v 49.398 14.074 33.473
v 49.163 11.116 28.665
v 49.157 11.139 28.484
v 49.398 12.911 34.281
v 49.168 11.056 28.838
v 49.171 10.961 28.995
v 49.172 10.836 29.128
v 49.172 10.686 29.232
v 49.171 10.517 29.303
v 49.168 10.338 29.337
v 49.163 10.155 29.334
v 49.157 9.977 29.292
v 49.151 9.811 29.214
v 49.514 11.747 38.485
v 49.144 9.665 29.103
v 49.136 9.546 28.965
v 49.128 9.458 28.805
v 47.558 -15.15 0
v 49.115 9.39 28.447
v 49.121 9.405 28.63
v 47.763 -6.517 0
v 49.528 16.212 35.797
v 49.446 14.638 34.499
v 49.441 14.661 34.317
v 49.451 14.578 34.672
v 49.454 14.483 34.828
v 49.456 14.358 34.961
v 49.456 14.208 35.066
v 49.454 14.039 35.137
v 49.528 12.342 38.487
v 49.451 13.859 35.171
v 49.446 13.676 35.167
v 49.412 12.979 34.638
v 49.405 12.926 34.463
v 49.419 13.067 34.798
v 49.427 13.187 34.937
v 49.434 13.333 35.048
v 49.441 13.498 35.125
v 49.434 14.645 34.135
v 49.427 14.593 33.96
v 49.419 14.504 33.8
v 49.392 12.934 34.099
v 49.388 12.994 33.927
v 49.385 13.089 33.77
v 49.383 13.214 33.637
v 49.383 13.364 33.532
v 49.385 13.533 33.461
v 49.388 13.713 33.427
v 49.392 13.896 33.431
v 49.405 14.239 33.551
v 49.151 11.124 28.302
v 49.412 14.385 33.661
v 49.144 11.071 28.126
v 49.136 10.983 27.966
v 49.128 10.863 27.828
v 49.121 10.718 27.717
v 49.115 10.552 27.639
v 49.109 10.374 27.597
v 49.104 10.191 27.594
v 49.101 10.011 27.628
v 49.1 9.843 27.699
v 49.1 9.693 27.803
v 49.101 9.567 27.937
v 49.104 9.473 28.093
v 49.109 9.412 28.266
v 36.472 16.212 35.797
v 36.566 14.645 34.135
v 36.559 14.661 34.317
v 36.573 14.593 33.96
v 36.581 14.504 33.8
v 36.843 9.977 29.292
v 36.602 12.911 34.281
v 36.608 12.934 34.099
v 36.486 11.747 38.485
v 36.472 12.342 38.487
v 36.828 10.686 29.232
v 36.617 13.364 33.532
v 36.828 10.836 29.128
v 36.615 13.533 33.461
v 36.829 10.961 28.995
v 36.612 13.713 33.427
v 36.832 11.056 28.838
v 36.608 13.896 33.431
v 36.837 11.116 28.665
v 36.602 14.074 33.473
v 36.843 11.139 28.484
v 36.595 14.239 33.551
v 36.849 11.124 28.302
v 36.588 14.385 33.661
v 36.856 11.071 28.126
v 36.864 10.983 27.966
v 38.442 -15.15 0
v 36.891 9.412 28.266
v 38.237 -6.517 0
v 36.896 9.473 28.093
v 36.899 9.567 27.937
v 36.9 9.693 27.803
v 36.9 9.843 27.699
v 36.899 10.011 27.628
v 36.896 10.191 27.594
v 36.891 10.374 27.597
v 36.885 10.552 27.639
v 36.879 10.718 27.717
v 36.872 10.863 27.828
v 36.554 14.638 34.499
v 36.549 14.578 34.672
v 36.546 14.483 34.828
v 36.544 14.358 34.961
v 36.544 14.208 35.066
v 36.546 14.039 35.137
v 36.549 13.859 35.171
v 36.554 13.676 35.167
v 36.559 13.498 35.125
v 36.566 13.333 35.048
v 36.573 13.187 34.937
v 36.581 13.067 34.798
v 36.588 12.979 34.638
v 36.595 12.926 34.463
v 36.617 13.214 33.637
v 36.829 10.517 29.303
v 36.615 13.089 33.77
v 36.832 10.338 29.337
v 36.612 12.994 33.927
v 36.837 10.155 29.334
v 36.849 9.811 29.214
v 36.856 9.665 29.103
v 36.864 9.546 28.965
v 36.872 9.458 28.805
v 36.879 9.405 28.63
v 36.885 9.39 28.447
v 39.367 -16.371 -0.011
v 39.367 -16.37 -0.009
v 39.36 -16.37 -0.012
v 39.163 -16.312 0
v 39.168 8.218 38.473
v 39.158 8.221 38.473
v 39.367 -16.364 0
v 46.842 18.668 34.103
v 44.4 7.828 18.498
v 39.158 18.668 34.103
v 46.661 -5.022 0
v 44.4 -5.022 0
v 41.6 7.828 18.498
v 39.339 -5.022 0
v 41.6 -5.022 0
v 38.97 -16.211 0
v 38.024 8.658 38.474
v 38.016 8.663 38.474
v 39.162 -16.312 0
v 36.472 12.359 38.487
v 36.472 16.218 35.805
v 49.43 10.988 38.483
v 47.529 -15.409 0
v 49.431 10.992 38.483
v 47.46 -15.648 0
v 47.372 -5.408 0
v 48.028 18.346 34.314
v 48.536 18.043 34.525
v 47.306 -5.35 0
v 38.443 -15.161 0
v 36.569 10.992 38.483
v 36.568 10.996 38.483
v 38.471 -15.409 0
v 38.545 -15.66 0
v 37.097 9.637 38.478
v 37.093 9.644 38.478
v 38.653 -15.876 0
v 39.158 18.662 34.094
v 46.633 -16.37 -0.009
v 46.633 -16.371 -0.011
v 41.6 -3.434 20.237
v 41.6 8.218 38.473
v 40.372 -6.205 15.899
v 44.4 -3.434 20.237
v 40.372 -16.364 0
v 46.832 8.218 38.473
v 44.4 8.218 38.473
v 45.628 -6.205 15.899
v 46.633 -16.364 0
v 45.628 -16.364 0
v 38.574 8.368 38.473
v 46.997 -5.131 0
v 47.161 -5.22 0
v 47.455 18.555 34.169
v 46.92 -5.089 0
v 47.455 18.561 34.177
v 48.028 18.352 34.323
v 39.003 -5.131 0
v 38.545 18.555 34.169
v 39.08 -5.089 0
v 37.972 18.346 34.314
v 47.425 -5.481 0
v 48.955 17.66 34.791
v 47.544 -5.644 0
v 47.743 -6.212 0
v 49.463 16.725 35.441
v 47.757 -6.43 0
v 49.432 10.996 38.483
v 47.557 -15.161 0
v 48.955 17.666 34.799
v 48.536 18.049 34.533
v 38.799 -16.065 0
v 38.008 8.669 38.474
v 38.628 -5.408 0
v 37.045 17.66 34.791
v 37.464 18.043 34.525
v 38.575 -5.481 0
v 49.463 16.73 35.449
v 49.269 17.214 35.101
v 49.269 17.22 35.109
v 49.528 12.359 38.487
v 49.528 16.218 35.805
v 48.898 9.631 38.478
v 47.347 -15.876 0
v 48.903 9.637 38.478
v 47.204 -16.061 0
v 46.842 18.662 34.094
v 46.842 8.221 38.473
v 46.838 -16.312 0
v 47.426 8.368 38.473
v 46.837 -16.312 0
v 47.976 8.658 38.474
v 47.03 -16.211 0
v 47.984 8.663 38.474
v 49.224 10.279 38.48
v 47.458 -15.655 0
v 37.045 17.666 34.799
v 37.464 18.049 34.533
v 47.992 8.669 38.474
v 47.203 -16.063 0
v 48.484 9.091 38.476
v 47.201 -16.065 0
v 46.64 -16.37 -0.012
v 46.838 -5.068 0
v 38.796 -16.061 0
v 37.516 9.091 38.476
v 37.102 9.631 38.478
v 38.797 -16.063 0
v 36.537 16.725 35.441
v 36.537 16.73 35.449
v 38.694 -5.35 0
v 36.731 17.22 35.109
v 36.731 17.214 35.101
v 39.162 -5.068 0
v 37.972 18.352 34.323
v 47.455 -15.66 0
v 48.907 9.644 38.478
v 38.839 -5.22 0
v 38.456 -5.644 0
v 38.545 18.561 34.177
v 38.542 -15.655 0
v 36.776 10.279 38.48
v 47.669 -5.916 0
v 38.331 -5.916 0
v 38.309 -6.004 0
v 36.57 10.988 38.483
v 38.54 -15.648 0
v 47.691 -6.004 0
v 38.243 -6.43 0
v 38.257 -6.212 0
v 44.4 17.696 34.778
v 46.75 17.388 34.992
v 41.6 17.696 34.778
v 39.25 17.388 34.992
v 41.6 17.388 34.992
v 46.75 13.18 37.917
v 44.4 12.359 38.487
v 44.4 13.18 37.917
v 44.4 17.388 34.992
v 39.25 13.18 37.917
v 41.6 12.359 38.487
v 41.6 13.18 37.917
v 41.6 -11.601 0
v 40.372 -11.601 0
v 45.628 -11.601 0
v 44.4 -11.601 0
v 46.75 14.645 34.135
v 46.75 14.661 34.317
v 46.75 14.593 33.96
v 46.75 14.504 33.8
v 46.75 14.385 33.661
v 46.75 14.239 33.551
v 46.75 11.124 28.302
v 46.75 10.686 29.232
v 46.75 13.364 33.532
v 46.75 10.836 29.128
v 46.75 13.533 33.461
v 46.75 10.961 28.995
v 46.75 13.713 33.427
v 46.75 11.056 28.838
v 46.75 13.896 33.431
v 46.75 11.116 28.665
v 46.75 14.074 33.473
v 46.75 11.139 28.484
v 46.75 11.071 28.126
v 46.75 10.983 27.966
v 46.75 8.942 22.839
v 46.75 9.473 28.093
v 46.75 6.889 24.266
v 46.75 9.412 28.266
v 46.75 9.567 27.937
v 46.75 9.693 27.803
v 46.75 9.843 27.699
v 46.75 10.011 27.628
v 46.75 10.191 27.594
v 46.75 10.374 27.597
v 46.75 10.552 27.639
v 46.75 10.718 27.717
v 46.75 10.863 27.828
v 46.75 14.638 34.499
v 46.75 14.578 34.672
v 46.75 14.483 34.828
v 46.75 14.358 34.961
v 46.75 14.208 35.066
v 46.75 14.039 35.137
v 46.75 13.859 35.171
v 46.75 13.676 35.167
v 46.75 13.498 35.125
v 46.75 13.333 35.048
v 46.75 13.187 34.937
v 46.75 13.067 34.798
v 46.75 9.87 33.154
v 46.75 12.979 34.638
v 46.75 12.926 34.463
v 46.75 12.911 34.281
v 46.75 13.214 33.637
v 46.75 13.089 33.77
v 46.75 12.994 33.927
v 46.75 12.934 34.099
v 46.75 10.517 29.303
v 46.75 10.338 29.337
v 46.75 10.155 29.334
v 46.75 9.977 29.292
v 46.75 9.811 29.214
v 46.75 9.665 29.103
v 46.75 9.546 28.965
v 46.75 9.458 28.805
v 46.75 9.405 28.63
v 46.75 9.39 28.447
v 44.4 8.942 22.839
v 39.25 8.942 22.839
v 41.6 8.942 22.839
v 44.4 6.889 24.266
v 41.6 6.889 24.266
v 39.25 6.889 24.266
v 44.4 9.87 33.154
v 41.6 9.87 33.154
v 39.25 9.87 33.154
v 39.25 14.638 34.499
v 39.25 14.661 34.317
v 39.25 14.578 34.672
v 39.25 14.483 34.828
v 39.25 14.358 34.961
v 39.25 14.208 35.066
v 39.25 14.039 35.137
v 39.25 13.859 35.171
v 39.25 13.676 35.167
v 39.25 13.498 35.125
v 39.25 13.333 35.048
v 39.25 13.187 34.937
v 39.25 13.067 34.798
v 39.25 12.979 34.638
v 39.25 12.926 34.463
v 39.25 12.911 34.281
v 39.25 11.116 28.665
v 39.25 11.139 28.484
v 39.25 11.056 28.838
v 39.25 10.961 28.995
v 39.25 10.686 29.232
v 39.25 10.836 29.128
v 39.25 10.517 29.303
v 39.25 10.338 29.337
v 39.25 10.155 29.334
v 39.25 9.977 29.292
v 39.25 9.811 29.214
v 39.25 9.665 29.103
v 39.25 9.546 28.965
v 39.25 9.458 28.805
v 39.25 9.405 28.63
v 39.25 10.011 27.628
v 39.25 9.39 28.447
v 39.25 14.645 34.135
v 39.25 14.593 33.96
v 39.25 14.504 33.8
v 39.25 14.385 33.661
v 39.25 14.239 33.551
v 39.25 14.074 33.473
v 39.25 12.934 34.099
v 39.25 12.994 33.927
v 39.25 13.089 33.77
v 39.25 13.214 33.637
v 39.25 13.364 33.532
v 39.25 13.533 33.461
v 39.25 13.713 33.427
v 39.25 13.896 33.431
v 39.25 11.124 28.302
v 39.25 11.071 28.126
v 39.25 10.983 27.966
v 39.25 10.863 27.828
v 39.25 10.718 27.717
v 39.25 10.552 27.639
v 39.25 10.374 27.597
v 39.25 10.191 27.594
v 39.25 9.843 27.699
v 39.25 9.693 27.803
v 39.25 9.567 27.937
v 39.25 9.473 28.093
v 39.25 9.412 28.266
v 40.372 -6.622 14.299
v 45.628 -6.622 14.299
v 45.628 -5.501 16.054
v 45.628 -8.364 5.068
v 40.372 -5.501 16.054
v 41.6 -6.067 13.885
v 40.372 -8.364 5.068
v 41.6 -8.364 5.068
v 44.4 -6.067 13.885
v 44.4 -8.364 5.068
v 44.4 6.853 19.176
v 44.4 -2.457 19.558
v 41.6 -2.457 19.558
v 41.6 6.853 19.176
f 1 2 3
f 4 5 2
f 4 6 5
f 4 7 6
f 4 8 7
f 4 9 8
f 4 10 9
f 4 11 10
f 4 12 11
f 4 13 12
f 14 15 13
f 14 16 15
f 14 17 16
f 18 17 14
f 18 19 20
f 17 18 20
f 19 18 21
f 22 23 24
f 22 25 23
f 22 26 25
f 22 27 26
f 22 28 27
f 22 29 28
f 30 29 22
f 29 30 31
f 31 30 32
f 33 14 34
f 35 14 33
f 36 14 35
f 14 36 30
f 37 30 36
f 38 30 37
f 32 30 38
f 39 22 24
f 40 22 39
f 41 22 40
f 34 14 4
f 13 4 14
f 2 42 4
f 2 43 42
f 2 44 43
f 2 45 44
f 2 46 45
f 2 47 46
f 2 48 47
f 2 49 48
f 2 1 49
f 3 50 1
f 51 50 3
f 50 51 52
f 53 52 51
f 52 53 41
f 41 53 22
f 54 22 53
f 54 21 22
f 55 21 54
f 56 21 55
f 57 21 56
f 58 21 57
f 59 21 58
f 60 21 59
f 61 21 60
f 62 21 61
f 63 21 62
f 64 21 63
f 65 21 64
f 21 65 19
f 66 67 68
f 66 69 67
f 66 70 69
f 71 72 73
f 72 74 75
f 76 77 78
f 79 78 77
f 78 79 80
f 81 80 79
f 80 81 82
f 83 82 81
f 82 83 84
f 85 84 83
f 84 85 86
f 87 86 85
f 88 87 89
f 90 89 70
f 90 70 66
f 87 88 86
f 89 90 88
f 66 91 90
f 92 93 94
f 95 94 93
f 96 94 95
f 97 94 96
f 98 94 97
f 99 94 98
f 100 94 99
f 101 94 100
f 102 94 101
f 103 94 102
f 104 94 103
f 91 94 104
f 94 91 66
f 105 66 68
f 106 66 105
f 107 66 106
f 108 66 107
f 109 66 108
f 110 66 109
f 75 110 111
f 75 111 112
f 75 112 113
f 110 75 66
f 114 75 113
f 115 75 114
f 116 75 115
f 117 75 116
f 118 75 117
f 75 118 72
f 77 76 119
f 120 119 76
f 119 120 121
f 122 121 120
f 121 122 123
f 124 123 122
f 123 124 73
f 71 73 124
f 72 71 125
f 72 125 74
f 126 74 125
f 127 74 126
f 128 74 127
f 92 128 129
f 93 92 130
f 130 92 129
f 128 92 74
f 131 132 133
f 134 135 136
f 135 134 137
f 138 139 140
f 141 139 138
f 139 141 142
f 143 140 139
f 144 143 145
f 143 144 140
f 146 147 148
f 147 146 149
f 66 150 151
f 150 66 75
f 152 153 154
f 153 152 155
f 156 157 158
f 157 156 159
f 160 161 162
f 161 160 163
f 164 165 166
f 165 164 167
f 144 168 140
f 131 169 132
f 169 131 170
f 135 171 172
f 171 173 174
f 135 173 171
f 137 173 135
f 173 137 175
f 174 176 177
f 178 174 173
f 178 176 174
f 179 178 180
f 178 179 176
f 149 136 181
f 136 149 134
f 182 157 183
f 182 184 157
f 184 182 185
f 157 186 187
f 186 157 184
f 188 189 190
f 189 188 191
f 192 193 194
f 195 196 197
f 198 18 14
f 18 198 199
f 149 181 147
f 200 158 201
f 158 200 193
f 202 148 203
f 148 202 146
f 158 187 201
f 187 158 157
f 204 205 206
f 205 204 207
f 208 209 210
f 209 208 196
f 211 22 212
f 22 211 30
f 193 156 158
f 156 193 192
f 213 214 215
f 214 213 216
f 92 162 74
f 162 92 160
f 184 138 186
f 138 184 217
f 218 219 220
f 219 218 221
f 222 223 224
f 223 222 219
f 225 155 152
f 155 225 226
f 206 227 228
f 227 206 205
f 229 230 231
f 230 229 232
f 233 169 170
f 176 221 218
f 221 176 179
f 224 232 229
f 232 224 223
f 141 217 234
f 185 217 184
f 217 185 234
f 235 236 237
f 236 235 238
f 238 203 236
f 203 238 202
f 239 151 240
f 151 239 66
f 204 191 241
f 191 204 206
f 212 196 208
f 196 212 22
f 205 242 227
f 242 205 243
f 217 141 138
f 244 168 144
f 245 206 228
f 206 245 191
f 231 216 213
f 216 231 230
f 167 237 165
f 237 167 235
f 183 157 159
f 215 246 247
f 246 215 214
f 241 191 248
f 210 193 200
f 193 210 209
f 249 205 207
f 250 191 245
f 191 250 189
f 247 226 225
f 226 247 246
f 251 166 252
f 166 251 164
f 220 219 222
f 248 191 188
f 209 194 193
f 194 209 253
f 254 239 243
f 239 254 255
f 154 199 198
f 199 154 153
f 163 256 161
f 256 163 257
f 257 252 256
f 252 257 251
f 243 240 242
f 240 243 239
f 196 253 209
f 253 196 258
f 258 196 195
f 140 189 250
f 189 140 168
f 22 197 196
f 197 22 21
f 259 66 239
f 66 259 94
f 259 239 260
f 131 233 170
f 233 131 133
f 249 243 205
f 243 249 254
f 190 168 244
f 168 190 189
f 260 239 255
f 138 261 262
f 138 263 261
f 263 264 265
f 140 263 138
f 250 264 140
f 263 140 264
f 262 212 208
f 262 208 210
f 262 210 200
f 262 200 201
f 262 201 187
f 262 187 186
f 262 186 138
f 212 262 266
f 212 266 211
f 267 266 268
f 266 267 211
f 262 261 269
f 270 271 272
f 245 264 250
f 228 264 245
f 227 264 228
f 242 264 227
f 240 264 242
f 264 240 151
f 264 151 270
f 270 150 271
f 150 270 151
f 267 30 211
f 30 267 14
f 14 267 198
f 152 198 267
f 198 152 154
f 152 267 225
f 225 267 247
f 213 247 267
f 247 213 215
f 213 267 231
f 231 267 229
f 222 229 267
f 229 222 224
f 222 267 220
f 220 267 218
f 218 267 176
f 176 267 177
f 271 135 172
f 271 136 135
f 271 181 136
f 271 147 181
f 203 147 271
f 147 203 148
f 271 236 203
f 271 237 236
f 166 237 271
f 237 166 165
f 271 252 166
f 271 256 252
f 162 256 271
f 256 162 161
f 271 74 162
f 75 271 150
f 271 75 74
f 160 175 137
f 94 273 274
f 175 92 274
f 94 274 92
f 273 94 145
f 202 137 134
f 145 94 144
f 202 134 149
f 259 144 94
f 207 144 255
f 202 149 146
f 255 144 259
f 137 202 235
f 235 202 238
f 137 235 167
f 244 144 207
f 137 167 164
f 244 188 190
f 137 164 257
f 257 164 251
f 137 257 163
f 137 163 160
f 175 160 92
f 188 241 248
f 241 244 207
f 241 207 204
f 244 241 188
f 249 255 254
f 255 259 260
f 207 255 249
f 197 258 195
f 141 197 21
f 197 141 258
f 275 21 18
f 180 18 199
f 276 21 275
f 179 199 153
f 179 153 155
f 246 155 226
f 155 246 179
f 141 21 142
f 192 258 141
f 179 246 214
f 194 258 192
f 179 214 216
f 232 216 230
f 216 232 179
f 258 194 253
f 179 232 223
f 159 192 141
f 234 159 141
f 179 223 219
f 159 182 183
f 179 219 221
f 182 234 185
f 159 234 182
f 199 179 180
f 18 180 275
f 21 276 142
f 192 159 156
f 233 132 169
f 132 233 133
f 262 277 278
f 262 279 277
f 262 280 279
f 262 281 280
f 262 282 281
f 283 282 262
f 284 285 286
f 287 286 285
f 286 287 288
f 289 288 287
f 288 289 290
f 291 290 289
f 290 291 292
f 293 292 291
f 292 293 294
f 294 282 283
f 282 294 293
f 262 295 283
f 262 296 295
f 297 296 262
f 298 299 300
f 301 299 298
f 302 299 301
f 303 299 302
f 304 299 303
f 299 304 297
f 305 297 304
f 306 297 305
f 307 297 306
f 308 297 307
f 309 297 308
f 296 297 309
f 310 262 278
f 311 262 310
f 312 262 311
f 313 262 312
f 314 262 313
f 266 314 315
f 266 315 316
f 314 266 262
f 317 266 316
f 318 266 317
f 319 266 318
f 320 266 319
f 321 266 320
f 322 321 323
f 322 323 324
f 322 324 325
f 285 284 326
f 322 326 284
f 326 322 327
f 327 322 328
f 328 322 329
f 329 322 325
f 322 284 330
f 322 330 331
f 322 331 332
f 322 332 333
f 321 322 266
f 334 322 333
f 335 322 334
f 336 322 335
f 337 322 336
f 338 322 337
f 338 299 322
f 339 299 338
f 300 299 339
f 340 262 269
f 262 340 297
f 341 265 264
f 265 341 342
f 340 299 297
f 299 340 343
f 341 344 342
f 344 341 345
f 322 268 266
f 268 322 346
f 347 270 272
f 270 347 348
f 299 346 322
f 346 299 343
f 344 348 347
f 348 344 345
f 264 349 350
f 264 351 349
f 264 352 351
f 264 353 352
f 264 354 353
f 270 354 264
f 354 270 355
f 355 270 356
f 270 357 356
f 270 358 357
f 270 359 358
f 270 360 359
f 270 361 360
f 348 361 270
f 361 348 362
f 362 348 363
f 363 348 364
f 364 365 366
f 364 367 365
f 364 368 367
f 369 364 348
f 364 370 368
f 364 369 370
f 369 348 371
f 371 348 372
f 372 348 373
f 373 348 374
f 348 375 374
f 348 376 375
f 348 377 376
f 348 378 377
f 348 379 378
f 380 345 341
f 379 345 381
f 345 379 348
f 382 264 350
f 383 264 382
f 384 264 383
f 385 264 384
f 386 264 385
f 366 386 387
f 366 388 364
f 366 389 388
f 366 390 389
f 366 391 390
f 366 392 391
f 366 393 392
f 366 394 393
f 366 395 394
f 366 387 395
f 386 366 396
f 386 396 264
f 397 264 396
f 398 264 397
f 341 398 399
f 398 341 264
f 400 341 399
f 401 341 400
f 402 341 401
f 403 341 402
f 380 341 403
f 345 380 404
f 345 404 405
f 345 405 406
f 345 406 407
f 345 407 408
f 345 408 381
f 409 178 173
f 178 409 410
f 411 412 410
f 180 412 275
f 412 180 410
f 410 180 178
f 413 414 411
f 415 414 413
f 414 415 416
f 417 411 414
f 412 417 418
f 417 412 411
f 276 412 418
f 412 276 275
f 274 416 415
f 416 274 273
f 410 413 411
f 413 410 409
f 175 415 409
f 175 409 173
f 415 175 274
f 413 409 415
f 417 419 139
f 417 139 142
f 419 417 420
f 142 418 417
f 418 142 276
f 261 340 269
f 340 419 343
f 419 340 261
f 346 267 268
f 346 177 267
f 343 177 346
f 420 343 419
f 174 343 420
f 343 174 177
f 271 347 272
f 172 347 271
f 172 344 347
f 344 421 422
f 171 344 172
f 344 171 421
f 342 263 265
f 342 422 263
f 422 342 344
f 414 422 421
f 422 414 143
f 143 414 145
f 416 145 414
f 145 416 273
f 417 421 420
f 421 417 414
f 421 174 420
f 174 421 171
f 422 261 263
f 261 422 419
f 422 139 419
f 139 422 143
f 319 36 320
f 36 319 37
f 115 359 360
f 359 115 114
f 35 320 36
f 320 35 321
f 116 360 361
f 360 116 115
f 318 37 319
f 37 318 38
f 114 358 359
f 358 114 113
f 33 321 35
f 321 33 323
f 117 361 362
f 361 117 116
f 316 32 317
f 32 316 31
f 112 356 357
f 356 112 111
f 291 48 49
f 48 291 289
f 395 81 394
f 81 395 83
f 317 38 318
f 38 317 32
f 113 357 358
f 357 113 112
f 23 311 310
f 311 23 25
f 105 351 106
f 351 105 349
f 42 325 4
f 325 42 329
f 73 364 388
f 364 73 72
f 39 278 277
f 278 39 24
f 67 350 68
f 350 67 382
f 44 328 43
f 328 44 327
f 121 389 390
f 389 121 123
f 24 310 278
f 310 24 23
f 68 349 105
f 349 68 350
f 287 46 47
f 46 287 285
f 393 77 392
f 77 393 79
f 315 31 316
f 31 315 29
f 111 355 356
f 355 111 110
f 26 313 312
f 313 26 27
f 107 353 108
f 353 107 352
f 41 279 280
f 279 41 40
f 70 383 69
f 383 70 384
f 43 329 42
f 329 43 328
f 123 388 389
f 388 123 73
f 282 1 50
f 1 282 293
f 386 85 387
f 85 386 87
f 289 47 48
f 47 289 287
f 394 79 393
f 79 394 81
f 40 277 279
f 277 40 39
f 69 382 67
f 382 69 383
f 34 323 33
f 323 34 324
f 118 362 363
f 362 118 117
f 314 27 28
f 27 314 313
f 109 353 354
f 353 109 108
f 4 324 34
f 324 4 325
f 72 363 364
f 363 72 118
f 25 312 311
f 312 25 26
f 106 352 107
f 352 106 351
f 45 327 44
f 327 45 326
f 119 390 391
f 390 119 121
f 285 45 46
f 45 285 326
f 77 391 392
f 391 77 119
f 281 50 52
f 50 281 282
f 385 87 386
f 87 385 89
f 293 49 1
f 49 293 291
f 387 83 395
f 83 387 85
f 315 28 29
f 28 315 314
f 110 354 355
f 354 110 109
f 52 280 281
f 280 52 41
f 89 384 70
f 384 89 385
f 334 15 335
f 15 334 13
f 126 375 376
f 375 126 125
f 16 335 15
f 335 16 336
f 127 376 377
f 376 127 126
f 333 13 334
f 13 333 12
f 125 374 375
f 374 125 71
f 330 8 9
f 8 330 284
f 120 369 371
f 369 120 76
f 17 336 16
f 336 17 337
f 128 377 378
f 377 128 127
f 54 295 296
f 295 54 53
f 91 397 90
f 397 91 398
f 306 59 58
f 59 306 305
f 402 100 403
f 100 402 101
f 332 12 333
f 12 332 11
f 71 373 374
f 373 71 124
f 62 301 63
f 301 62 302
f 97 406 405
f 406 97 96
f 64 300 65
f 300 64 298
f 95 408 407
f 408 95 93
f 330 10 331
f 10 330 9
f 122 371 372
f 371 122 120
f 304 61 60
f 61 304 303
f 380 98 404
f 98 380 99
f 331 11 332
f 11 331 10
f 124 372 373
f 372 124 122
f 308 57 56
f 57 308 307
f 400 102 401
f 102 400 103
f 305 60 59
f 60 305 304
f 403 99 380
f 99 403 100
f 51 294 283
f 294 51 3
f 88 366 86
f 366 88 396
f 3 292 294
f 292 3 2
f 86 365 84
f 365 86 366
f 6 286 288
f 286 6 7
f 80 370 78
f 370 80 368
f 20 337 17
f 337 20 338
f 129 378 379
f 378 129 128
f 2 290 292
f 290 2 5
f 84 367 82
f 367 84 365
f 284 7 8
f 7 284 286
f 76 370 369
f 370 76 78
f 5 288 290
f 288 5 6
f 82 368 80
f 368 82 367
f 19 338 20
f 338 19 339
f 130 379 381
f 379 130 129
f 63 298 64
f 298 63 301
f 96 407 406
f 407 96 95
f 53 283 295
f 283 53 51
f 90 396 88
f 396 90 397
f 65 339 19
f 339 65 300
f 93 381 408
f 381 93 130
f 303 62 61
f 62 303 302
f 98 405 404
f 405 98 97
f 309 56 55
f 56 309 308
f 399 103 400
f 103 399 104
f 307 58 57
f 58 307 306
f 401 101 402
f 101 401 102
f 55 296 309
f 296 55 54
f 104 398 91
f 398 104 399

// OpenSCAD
// file: bezier.scad
/* Copied more or less blindly from https://benjaminwand.github.io/verbose-cv/projects/bezier_curves.html */

// --- VARIABLES ---
// roughly the size of parts of curves
// fs = 0.5;

// points
p1 = [5.5, 0];
p2 = [1.5, 0];
p3 = [0, 2];
p4 = [0, 7];

// --- FUNCTIONS AND MODULES ---
// calculates the amount of points
// from distance of two points and fs
function fn(a, b, fs=0.5) =
  round(sqrt(pow(a[0]-b[0],2)
  + pow(a[1]-b[1], 2))/fs);

// calculate each individual point
function b_pts(pts, n, idx) =
  len(pts)>2 ?
    b_pts([for(i=[0:len(pts)-2])
        pts[i]], n, idx) * n*idx
      + b_pts([for(i=[1:len(pts)-1])
        pts[i]], n, idx) * (1-n*idx)
    : pts[0] * n*idx
      + pts[1] * (1-n*idx);

// calculate fn() for given points,
// call b_pts() and concatenate points
function b_curv(pts, fs=0.5) =
  let (fn=fn(pts[0], pts[len(pts)-1], fs=fs))
    [for (i= [0:fn])
      concat(b_pts(pts, 1/fn, i))];

// displaying points as a rainbow
module rainbow (points) {
for (i= [0 : len(points)-1 ])
  color([cos(20*i)/2+0.5,
    -sin(20*i)/2+0.5,
    -cos(20*i)/2+0.5,
    1])
  translate(points[i]) sphere(0.5, $fn=10);
}
/*
// --- THE ACTUAL MODEL ---
// calculating the points
points = b_curv([p1, p2, p3, p4]);

// displaying the calculated points
// rainbow(points);
linear_extrude(20){
    polygon(points=points);
    
}

// displaying [p1 .. p4]
for (i=[p1, p2, p3, p4])
  translate(i) color("black")
    cylinder(1, 0.2, 0.2, $fn=10);
    */
// file: front-linkage.scad
front_linkage_width = first_extension_end_width - 4*wall_thickness;
front_linkage_height = top_linkage_thickness;
front_linkage_rectangle_length =  0*front_linkage_height*tan(first_extension_angle) + front_linkage_length/2;
front_linkage_trim_length = front_linkage_rectangle_length/4; // the distance that the front linkage goes into the first extension
// front_linkage_trim_length = 0;

module front_linkage(){
    translate(translations[8]) {
        rotate(rotations[8]){
            difference(){
                front_linkage_solid();
                front_linkage_holes();
            }
        }
    }
}

module front_linkage_solid(){
    translate([0, 0, position_for == "printing" ? front_linkage_width/2 : 0]) {
        hull(){
            translate(front_extension_first_rotation_origin + front_extension_second_rotation_origin + [0,0,0]) {
                cylinder(r=top_linkage_thickness/2, h=front_linkage_width, center=true);
            }
            translate([ -front_linkage_trim_length + front_gear_centre_position[0] + first_extension_start + first_extension_length, front_linkage_trim_length * sin(first_extension_top_angle) + second_joint_extension_bottom + first_extension_end_height, 0]) {
                front_linkage_wedge(tiny_distance, tiny_distance);
            }
        }
        translate([ - front_linkage_trim_length + front_gear_centre_position[0] + first_extension_start + first_extension_length, second_joint_extension_bottom + first_extension_end_height + top_linkage_thickness*sin(first_extension_top_angle), 0]) {
            front_linkage_wedge();
        }
        
    }
}

module front_linkage_holes(){
    translate(front_extension_first_rotation_origin + front_extension_second_rotation_origin + [0,0,0]) {
        cylinder(r=pin_hole_radius, h=large_distance, center=true);
    }
    translate([front_gear_centre_position[0] + first_extension_start + first_extension_length, second_joint_extension_bottom + first_extension_end_height, 0]) {
        rotate([0, 0, -first_extension_top_angle]){
            translate([-front_linkage_rectangle_length, -top_linkage_thickness/2, 0]) {
                cylinder(r=pin_hole_radius, h=large_distance, center=true);
                translate([front_linkage_rectangle_length/2, 0, 0]) {
                    cylinder(r=pin_hole_radius, h=large_distance, center=true);
                }
            }
        }
    }
}

module front_linkage_wedge(wedge_length = front_linkage_length - front_linkage_trim_length, rectangle_length = front_linkage_rectangle_length - front_linkage_trim_length) {
    // If you put in a small distance for each of those lengths, you'll get a sliver that you can make hulls with
        rotate([0, 0, -first_extension_top_angle]) {
            linear_extrude(front_linkage_width, center=true){
                polygon(points =    [[0, 0],
                                    [-wedge_length, 0],
                                    [-rectangle_length, -front_linkage_height],
                                    [0, -front_linkage_height]
                                    ]);
            }
        }
}
// file: front-extension.scad
/* The frontmost extension. Built in the visualisation view */

front_extension_bottom_hole_position = long_linkage_first_corner_position + long_linkage_fourth_corner_position + [0,0,0]; // heehee I said bottom hole
long_linkage_backwards_movement = second_joint_extension_middle_pin_position[2] - second_joint_front_hole_translation[1]; // to see how this is calculated, look at the rotation tests in the second joint file
echo(str("linkage backwards movement is ", long_linkage_backwards_movement));
front_extension_top_hole_position = front_extension_bottom_hole_position + [-long_linkage_backwards_movement / 2, long_linkage_backwards_movement / 2, 0];

front_extension_first_rotation_origin = [front_gear_centre_position[0], 0, 0];
front_extension_second_rotation_origin = front_extension_top_hole_position - [front_gear_centre_position[0],0,0]; //relative to the front gear origin

front_extension_end_height = first_extension_end_height - (second_joint_extension_height - first_extension_end_height);
front_linkage_width = first_extension_end_width - 2*wall_thickness;

front_extension_printing_translation = [front_extension_first_rotation_origin[0] - first_extension_length - second_joint_total_length - clearance_between_extensions , 0, 0];
front_extension_printing_rotation = position_for == "printing" ? [0, 0, 90+first_extension_angle] : [0,0,0];

test_rotation = 0;

module front_extension(){
    translate(translations[7]){
        translate(front_extension_first_rotation_origin) {
            rotate(rotations[7]){
                rotate([0, 0, visualisation_rotation]){
                    translate(front_extension_second_rotation_origin) rotate([0, 0, visualisation_rotation] + [0, 0, -test_rotation]) translate(-front_extension_second_rotation_origin){
                        rotate(front_extension_printing_rotation){
                            translate(position_for == "printing" || position_for == "comparison" ? front_extension_printing_translation : [0,0,0]) {
                                difference(){
                                    front_extension_solid();
                                    front_extension_void();
                                    front_extension_holes();
                                }
                            }
                        }
                    }
                }
            }
        }
    }
}

module front_extension_solid() {
    start_width = this_is_a_thumb ? second_joint_extension_width : first_extension_end_width;
    difference(){
        translate([first_extension_length + clearance_between_extensions, second_joint_extension_bottom, -start_width/2]) {
            hull(){
                cube([tiny_distance, first_extension_end_height, start_width]);
                translate([front_extension_length - front_extension_end_height/2, 0, 0]) {
                    cube([tiny_distance, front_extension_end_height, first_extension_end_width]);
                }
            }
            translate([front_extension_length - front_extension_end_height/2, front_extension_end_height/2, 0]) {
                rotate([0, 0, 0]){
                    cylinder(d=front_extension_end_height, h=first_extension_end_width, center=false);
                }
            }
        }
        translate([-front_extension_first_rotation_origin[0] + first_extension_length + second_joint_total_length + clearance_between_extensions, 0, 0]){
            rotate([0, 0, -first_extension_angle]){
                translate([-large_distance, -large_distance/2, -large_distance/2]) {
                    cube([large_distance, large_distance, large_distance]);
                }
            }
        }
        translate(front_extension_bottom_hole_position + [-front_gear_centre_position[0], 0, 0]){
            rotate([0, 0, 180-first_extension_angle]){
                translate([-large_distance/2, top_linkage_thickness/2 + top_linkage_clearance, -large_distance/2]) {
                    cube([large_distance, large_distance, large_distance]);
                }
            }
        }
    }
}

module front_extension_void() {
    cube_size=first_extension_end_height; // close enough
    translate([-cube_size + front_extension_top_hole_position[0] - front_gear_centre_position[0] + top_linkage_thickness/2 + top_linkage_clearance, second_joint_extension_bottom, -front_linkage_width/2- second_joint_linear_clearance]) {
        cube([cube_size, first_extension_end_height-wall_thickness, front_linkage_width + second_joint_linear_clearance*2]);
    }
    translate([-cube_size + front_extension_bottom_hole_position[0] - front_gear_centre_position[0] + top_linkage_thickness/2 + top_linkage_clearance, second_joint_extension_bottom, -thin_linkage_thickness/2- top_linkage_clearance]) {
        cube([cube_size, first_extension_end_height-wall_thickness, thin_linkage_thickness + second_joint_linear_clearance*2]);
    }
    rotate([-90,0,0])
    for (i=[-1:1]) {
        translate([-front_gear_centre_position[0], i * second_joint_linear_clearance, really_small_clearance]) {
            front_linkage();
        }
    }
    
}

module front_extension_holes() {
    // The long linkage
    translate([-front_gear_centre_position[0], 0, 0]){
        translate(front_extension_bottom_hole_position){
            cylinder(r=pin_hole_radius, h=large_distance, center=true);
        }
        // The centre of rotation
        translate(front_extension_top_hole_position){
            cylinder(r=pin_hole_radius, h=large_distance, center=true);
        }
    }
}


module front_extension_tests(){
    rotate([90, 0, 0]){
        translate(front_extension_bottom_hole_position + [0,0,0]){
            cylinder(r=pin_hole_radius, h=large_distance, center=true);
        }
        translate(front_extension_top_hole_position + [0,0,0]){
            cylinder(r=pin_hole_radius, h=large_distance, center=true);
        }
        translate(-front_extension_second_rotation_origin + [0,0,0]){
            // cylinder(r=pin_hole_radius, h=large_distance, center=true);
        }
    }
}
// file: prefs.scad
/* All the parameters that you'd call user prefs are here, mainly to avoid cluttering the git history */

/***********************************************************************
 * Finger measurements. These include all the tolerance you're getting *
 ***********************************************************************/

// These measurements correspond to the file AFE-Finger-T21-W25-L28-T20-W22-T15-W18-L58.STL
// base_thickness = 21;
// base_width = 25;
// base_length = 28;
// joint_thickness = 20;
// joint_width = 22;
// tip_thickness = 15;
// tip_width = 18;
// tip_length = 58;
// this_is_a_thumb = false;

// My left index finger, more comfortable on the right
// base_thickness = 20;
// base_width = 22;
// base_length = 28;
// joint_thickness = 17.5;
// joint_width = 22;
// tip_thickness = 13.5;
// tip_width = 18;
// tip_length = 44;
// this_is_a_thumb = false;

// My left ring finger, more comfortable on the right
// base_thickness = 20;
// base_width = 21;
// base_length = 25;
// joint_thickness = 20;
// joint_width = 20;
// tip_thickness = 15;
// tip_width = 18;
// tip_length = 45.5;
// this_is_a_thumb = false;

// My left middle finger, more comfortable on the right
// base_thickness = 21.5;
// base_width = 22;
// base_length = 28;
// joint_thickness = 21.5;
// joint_width = 21.5;
// tip_thickness = 16;
// tip_width = 18.5;
// tip_length = 47.5;
// this_is_a_thumb = false;

// My scrawny left little finger; the tip thickness needs to be taken down
// base_thickness = 13.5;
// base_width = 21;
// base_length = 17;
// joint_thickness = 17.5;
// joint_width = 17.5;
// tip_thickness = 14;
// tip_width = 16;
// tip_length = 35.5;
// this_is_a_thumb = false;

// My right little finger
base_thickness = 18.5;
base_width = 20;
base_length = 19.5;
joint_thickness = 18;
joint_width = 19;
tip_thickness = 14;
tip_width = 17;
tip_length = 36.5;
this_is_a_thumb = false;


// My left thumb
// base_thickness = 21;
// base_width = 24;
// base_length = 19;
// joint_thickness = 20.5;
// joint_width = 23.5;
// tip_thickness = 17;
// tip_width = 22.5;
// tip_length = 34.5;
// this_is_a_thumb = true;

/****************************************************
 * Other measurements that you might want to change *
 ****************************************************/
extra_finger_length = 12; // set this to at least 5
first_extension_length = 48;
first_extension_width_reduction = 4; // how much thinner the end of the first extension will be than the start
first_extension_height_reduction = 1;
front_extension_length = 70;



/******************************
 * What do you want to print? *
 ******************************/
// print_everything = true; // This will override any of the choices below
print_everything = false;

print_first_joint = false;
print_second_joint = false;
print_top_linkage = false;
print_rear_gear = false;
print_front_gear = false;
// print_first_extension = false;
print_long_linkage = false;
print_front_linkage = false;
print_front_extension = false;

// print_first_joint = true;
// print_second_joint = true;
// print_top_linkage = true;
// print_rear_gear = true;
// print_front_gear = true;
print_first_extension = true;
// print_long_linkage = true;
// print_front_linkage = true;
// print_front_extension = true;

print_first_joint_length_tests = false;
print_first_joint_test_holes = false;
print_top_linkage_test_holes = false;
print_second_joint_length_tests = false;
print_second_joint_rotation_tests = false;
print_first_extension_tests = false;
print_front_extension_tests = false;
print_rear_gear_tests = false;
print_rear_gear_sweep = false;


/************************************
 * and how do you want to print it? *
 ************************************/
// position_for = "comparison";
// position_for = "visualisation";
position_for = "printing";
// position_for = "origin";
finger_bend_angle = 0;
detailed = true;
// main file
echo("\n\n"); //just to make the output a bit clearer

include <prefs.scad>;

/* shared parameters */
wall_thickness = 1.2;
thin_wall_thickness = 0.75;
pin_hole_radius = 1.75 / 2;
pin_hole_clearance = 1.75; //The closest a pin hole should come to the edge of a large part
linkage_pin_hole_clearance = 1.75 / 2; // the same, but for a small part
string_hole_diameter = 1; //Sorry about mixing diameters and radii. I made a mistake early on and I'm tired
maximum_finger_bend_angle = 80;
elastic_hole_radius = 1;
gear_thickness = 6.5;
thin_linkage_thickness = 2;
really_small_clearance = 0.1;
printing_clearance = 5;

/* top linkage parameters */
top_linkage_clearance = 0.4;
top_linkage_thickness = pin_hole_radius*2 + linkage_pin_hole_clearance*2;
top_linkage_width = gear_thickness - top_linkage_clearance*2 + wall_thickness*4;
top_linkage_end_width = top_linkage_width - 2*top_linkage_clearance - 2*wall_thickness;
top_linkage_a_bit_closer_to_the_hand = -top_linkage_thickness;

/* gear parameters */
//chosen
// gear_inner_diameter = 7.5; // If you set this at 8.9. it'll match the original
gear_inner_diameter = pin_hole_radius*2 + pin_hole_clearance*2; // If you set this at 8.9. it'll match the original
gear_tooth_length = 1.5;
teeth_in_a_full_circle = 12; //the number of gears in a whole circle
rear_gear_number_of_teeth = 5;
front_gear_number_of_teeth = 5;
gear_cutoff_diameter = 7.5;
rear_gear_arm_thin_thickness = top_linkage_thickness/2;
// clearance_between_gears = 0.2;
gear_tolerance = 0;
gear_maximum_rotation = 90; // if you want to change this, then you've got some maths to do with the second joint rotation - see the module second_joint_rotation_tests
front_gear_slope_start = 13;
front_gear_slope_end = 22;
front_gear_rounding = 1.5; //Well, it's actually 'squaring'...
// I think I've calculated the angle of the gear teeth in a mathematically correct way,
// but that resulted in the finger not quite straightening. So this is an ad hoc correction for that.
// front_gear_correction_angle = 0.25;
front_gear_correction_angle = 0;
wedge_insertion_tolerance = 0.5;
//calculated
gear_extra_rotation = position_for == "comparison" ? -90 :
                            position_for == "visualisation" ? 90 - (gear_maximum_rotation / maximum_finger_bend_angle * finger_bend_angle) : 0;
echo(str("gears rotated by ", gear_extra_rotation));
gear_outer_diameter = gear_inner_diameter + 2/gear_tooth_length;
temp_rear_gear_height = -pin_hole_radius;

/* second joint parameters */
// chosen
second_joint_angle = 35;
// second_joint_extension_height = 14.7;
// second_joint_extension_width = 14;
hand_joint_raidus = 1.5;
second_joint_extension_corner_radius = 3;
second_joint_linear_clearance = 0.5;
second_joint_radial_clearance = 0.2;
second_joint_tab_length = 15;
second_joint_tab_width = hand_joint_raidus*4;
// I assume that the place where your tip thickness is measured
// is 3/4 of the way from the joint to the tip of a finger,
// or halfway if it's a thumb
tip_measurement_distance = this_is_a_thumb ? tip_length/2 : tip_length * 0.75;
//calculated
adjusted_finger_length = tip_length + extra_finger_length;
finger_tube_end_thickness = joint_thickness - (joint_thickness - tip_thickness) * adjusted_finger_length / tip_measurement_distance;
finger_tube_end_width = joint_width - (joint_width - tip_width) * adjusted_finger_length / tip_measurement_distance;
second_joint_sphere_height = finger_tube_end_thickness + wall_thickness*2;
second_joint_finger_tube_length = adjusted_finger_length + wall_thickness - second_joint_sphere_height/2;
// second_joint_tube_angle = 0;
// second_joint_height_adjustment = ((joint_thickness-tip_thickness)/2) * (second_joint_finger_tube_length - 4*knuckle_joint_raidus)/second_joint_finger_tube_length;
second_joint_height_adjustment = ((joint_thickness - finger_tube_end_thickness)/2);
// second_joint_tube_angle = atan((joint_thickness - tip_thickness)/(2*second_joint_finger_tube_length));
second_joint_tube_angle = atan(second_joint_height_adjustment/(second_joint_finger_tube_length));
second_joint_bottom_of_finger_tube = -second_joint_height_adjustment + joint_thickness/2 + wall_thickness;

/* first joint parameters */
//chosen
first_joint_angle = 48.5;
// first_joint_angle = 60;
knuckle_joint_raidus = 1.5;
base_straight_section_length = top_linkage_thickness*2;
string_guide_distance = joint_thickness*.25 ;
string_guide_radius = 2;
string_guide_angle = 20;
first_joint_height_offset = 0; // a little shift to stop the top linkage clashing with the finger tube
// first_joint_height_offset = wall_thickness; // a little shift to stop the top linkage clashing with the finger tube
first_joint_housing_overhang = top_linkage_thickness - pin_hole_clearance;
//calculated
first_joint_length_offset = first_joint_height_offset * tan(string_guide_angle);
join_with_second_joint = (wall_thickness -base_length) /2 - first_joint_length_offset;
first_joint_finger_length = base_length - join_with_second_joint;
// The cylinder's cross section is base_thickness x base_width at the hand end,
// then it's joint_thickness x joint_width at the joint.
// So we need to work out what it is at the end
first_joint_end_thickness = base_thickness - (first_joint_finger_length / base_length) * (base_thickness - joint_thickness);
// first_jfingerend_thickness = joint_thickness;
echo(str("first joint end thickness is ", first_joint_end_thickness));
first_joint_end_width = base_width - (first_joint_finger_length / base_length) * (base_width - joint_width);
first_joint_end_height_shift = second_joint_bottom_of_finger_tube - first_joint_end_thickness/2 - wall_thickness;
first_joint_linkage_housing_inner_displacement = first_joint_end_height_shift -first_joint_end_thickness/2 - wall_thickness - top_linkage_thickness - first_joint_height_offset;
first_joint_linkage_housing_outer_displacement = first_joint_linkage_housing_inner_displacement - thin_wall_thickness;
front_of_first_joint = -(first_joint_end_thickness/2 + wall_thickness + second_joint_height_adjustment) * tan(first_joint_angle);
first_joint_total_length = base_length - front_of_first_joint;
first_joint_pin_hole_position = [0, first_joint_linkage_housing_inner_displacement + top_linkage_thickness/2 + pin_hole_clearance - pin_hole_radius , front_of_first_joint + top_linkage_thickness/2];
// finger_bend_origin = [ knuckle_joint_raidus + second_joint_finger_tube_length - sqrt(pow(second_joint_finger_tube_length, 2) - pow(second_joint_height_adjustment, 2)), 0, second_joint_height_adjustment];

/* first extension parameters */
//chosen
clearance_between_extensions = 1;
first_extension_angle = 34.8;

/* long linkage paramters */
long_linkage_clearance = 5; // shave a bit off the length

/* front linkage parameters */
front_linkage_rear_section_length = 20;
front_linkage_thickness = pin_hole_radius*2 + pin_hole_clearance*2;
front_linkage_length = first_extension_length * 0.45;

/* housekeeping */
large_distance = 100;
tiny_distance = 0.01;
$fn = 30;


position_for_comparison_translations = [
    [base_width/2 + wall_thickness*2, 42, 0], // first joint
    [105, 62.5, 0], // top linkage
    [43.9, 14.5, 0], // second joint
    [56, 13, gear_thickness], // rear gear
    [24, 7.8, 0], // first extension
    [7, 49, gear_thickness/2], // front gear
    [0, 0, 0], // long_linkage
    [0, 22, 6.25], // front extension
    [0, 0, 0], // front linkage
];

position_for_comparison_rotations = [
    [-first_joint_angle, 0, 0], // first joint
    [0, 0, 180], // top linkage
    [-second_joint_angle, 0, 0], // second joint
    [180, 0, 35], // rear gear
    [90, 90-first_extension_angle, -90], // first extension
    [180, 0, 0], // front gear
    [0, 0, 0], // long_linkage
    [90, -90-first_extension_angle, -90], // front extension
    [0, 0, 0], // front linkage
];

position_for_printing_translations = [
    [0, 0, 0], // first joint
    [joint_width, joint_thickness/2, 0], // top linkage
    [base_width + wall_thickness + 0*printing_clearance, -finger_tube_end_thickness, 0], // second joint
    [-finger_tube_end_width/2, -second_joint_finger_tube_length/2 + printing_clearance + top_linkage_width/2, 0], // rear gear
    [joint_width*2 + printing_clearance, -finger_tube_end_thickness*1.5, 0], // first extension
    [0, -second_joint_finger_tube_length, gear_thickness/2], // front gear
    [second_joint_finger_tube_length/2, joint_thickness + top_linkage_width*2, thin_linkage_thickness/2], // long_linkage
    [joint_width*3 + printing_clearance - front_extension_length + finger_tube_end_width/2, -finger_tube_end_thickness*1.5, 0], // front extension
    [-second_joint_finger_tube_length - finger_tube_end_width + printing_clearance, top_linkage_width*2, 0], // front linkage
];

position_for_printing_rotations = [
    [-first_joint_angle, 0, 0], // first joint
    [0, 0, 0], // top linkage
    [-second_joint_angle, 0, 0], // second joint
    [0, 0, 40], // rear gear
    [0, 0, -90], // first extension
    [0, 0, 90], // front gear
    [0, 0, 90], // long_linkage
    [90, 0, -90], // front extension
    [0, 0, 0], // front linkage
];

position_for_origin_translations = [
    [0, 0, 0], // first joint
    [0, 0, 0], // top linkage
    [0, 0, 0], // second joint
    [0, 0, 0], // rear gear
    [0, 0, 0], // first extension
    [0, 0, 0], // front gear
    [0, 0, 0], // long_linkage
    [0, 0, 0], // front extension
    [0, 0, 0], // front linkage
];

position_for_origin_rotations = [
    [0, 0, 0], // first joint
    [0, 0, 0], // top linkage
    [0, 0, 0], // second joint linkage
    [0, 0, 0], // rear gear
    [0, 0, 0], // first extension
    [0, 0, 0], // front gear
    [0, 0, 0], // long_linkage
    [0, 0, 0], // front extension
    [0, 0, 0], // front linkage
];

// The dimensions for the visualisation are: sideways, backwards, up
position_for_visualisation_translations = [
    [0, 0, 0], // first joint
    [0, 0, 0], // top linkage
    [0, 0, 0], // second joint
    [0, gear_thickness/2, 0], // rear gear
    [0, 0, 0], // first extension
    [0, 0, 0], // front gear
    [0, 0, 0], // long_linkage
    [0, 0, 0], // front extension
    [0, 0, 0], // front linkage
];

position_for_visualisation_rotations = [
    [-90, 0, 90], // first joint
    [0, 0, 0], // top linkage
    [-90, 0, 90], // second joint
    [90, 0, 0], // rear gear
    [90, 0, 0], // first extension
    [90, 0, 0], // front gear
    [90, 0, 0], // long_linkage
    [90, 0, 0], // front extension
    [90, 0, 0], // front linkage
];

translations = (position_for == "comparison") ? position_for_comparison_translations :
    (position_for == "visualisation") ? position_for_visualisation_translations :
    (position_for == "printing")  ? position_for_printing_translations :  position_for_origin_translations;
rotations = (position_for == "comparison") ? position_for_comparison_rotations :
    (position_for == "visualisation") ? position_for_visualisation_rotations :
    (position_for == "printing") ? position_for_printing_rotations : position_for_origin_rotations;

if(position_for == "comparison"){
    translate([0, 0, -18.4]) {
        %import("AFE-Finger-T21-W25-L28-T20-W22-T15-W18-L58.STL");
        // translate([6.5, 4, 3.5]) {
        //     %import("AFE-Finger-T16.5-W18-L20.5-T15-W16-T11.5-W13.5-L39.5.STL");
        // }
    }
}


/*****************************************************************/

include <top_linkage.scad>;
include <gears.scad>;
include <first-joint.scad>;
include <second-joint.scad>;
include <first-extension.scad>;
include <long-linkage.scad>;
include <front-extension.scad>;
include <front-linkage.scad>;

if (print_first_joint || print_everything) first_joint();
if (print_second_joint || print_everything) second_joint();
if (print_top_linkage || print_everything) top_linkage();
if (print_rear_gear || print_everything) rear_gear();
if (print_first_extension || print_everything) first_extension();
if (print_front_gear || print_everything) front_gear();
if ((print_long_linkage || print_everything) && !this_is_a_thumb) long_linkage();
if ((print_front_extension || print_everything) && !this_is_a_thumb) front_extension();
if ((print_front_linkage || print_everything) && !this_is_a_thumb) front_linkage();

if(print_first_joint_length_tests) %first_joint_length_tests();
if (print_first_joint_test_holes) %first_joint_test_holes();
if(print_top_linkage_test_holes) %top_linkage_test_holes();
if(print_second_joint_length_tests) %second_joint_length_tests();
if(print_second_joint_rotation_tests) %second_joint_rotation_tests();
if(print_first_extension_tests) %first_extension_tests();
if(print_front_extension_tests) %front_extension_tests();
if (print_rear_gear_tests) rear_gear_tests();
if (print_rear_gear_sweep) %gear_sweep();

/******************
 * Common modules *
 ******************/

module horizontal_pin_hole() {
    rotate([0, 90, 0]) {
        cylinder(r=pin_hole_radius, h=large_distance, center=true);
    }
}

module smooth(r=3)
{
    $fn=30;
    offset(r=r)
    offset(r=-r)
    children();
}

module rotate_about_origin(origin, angles){
    translate(origin){
        rotate(angles){
            translate(-origin){
                children();
            }
        }
    }
}
